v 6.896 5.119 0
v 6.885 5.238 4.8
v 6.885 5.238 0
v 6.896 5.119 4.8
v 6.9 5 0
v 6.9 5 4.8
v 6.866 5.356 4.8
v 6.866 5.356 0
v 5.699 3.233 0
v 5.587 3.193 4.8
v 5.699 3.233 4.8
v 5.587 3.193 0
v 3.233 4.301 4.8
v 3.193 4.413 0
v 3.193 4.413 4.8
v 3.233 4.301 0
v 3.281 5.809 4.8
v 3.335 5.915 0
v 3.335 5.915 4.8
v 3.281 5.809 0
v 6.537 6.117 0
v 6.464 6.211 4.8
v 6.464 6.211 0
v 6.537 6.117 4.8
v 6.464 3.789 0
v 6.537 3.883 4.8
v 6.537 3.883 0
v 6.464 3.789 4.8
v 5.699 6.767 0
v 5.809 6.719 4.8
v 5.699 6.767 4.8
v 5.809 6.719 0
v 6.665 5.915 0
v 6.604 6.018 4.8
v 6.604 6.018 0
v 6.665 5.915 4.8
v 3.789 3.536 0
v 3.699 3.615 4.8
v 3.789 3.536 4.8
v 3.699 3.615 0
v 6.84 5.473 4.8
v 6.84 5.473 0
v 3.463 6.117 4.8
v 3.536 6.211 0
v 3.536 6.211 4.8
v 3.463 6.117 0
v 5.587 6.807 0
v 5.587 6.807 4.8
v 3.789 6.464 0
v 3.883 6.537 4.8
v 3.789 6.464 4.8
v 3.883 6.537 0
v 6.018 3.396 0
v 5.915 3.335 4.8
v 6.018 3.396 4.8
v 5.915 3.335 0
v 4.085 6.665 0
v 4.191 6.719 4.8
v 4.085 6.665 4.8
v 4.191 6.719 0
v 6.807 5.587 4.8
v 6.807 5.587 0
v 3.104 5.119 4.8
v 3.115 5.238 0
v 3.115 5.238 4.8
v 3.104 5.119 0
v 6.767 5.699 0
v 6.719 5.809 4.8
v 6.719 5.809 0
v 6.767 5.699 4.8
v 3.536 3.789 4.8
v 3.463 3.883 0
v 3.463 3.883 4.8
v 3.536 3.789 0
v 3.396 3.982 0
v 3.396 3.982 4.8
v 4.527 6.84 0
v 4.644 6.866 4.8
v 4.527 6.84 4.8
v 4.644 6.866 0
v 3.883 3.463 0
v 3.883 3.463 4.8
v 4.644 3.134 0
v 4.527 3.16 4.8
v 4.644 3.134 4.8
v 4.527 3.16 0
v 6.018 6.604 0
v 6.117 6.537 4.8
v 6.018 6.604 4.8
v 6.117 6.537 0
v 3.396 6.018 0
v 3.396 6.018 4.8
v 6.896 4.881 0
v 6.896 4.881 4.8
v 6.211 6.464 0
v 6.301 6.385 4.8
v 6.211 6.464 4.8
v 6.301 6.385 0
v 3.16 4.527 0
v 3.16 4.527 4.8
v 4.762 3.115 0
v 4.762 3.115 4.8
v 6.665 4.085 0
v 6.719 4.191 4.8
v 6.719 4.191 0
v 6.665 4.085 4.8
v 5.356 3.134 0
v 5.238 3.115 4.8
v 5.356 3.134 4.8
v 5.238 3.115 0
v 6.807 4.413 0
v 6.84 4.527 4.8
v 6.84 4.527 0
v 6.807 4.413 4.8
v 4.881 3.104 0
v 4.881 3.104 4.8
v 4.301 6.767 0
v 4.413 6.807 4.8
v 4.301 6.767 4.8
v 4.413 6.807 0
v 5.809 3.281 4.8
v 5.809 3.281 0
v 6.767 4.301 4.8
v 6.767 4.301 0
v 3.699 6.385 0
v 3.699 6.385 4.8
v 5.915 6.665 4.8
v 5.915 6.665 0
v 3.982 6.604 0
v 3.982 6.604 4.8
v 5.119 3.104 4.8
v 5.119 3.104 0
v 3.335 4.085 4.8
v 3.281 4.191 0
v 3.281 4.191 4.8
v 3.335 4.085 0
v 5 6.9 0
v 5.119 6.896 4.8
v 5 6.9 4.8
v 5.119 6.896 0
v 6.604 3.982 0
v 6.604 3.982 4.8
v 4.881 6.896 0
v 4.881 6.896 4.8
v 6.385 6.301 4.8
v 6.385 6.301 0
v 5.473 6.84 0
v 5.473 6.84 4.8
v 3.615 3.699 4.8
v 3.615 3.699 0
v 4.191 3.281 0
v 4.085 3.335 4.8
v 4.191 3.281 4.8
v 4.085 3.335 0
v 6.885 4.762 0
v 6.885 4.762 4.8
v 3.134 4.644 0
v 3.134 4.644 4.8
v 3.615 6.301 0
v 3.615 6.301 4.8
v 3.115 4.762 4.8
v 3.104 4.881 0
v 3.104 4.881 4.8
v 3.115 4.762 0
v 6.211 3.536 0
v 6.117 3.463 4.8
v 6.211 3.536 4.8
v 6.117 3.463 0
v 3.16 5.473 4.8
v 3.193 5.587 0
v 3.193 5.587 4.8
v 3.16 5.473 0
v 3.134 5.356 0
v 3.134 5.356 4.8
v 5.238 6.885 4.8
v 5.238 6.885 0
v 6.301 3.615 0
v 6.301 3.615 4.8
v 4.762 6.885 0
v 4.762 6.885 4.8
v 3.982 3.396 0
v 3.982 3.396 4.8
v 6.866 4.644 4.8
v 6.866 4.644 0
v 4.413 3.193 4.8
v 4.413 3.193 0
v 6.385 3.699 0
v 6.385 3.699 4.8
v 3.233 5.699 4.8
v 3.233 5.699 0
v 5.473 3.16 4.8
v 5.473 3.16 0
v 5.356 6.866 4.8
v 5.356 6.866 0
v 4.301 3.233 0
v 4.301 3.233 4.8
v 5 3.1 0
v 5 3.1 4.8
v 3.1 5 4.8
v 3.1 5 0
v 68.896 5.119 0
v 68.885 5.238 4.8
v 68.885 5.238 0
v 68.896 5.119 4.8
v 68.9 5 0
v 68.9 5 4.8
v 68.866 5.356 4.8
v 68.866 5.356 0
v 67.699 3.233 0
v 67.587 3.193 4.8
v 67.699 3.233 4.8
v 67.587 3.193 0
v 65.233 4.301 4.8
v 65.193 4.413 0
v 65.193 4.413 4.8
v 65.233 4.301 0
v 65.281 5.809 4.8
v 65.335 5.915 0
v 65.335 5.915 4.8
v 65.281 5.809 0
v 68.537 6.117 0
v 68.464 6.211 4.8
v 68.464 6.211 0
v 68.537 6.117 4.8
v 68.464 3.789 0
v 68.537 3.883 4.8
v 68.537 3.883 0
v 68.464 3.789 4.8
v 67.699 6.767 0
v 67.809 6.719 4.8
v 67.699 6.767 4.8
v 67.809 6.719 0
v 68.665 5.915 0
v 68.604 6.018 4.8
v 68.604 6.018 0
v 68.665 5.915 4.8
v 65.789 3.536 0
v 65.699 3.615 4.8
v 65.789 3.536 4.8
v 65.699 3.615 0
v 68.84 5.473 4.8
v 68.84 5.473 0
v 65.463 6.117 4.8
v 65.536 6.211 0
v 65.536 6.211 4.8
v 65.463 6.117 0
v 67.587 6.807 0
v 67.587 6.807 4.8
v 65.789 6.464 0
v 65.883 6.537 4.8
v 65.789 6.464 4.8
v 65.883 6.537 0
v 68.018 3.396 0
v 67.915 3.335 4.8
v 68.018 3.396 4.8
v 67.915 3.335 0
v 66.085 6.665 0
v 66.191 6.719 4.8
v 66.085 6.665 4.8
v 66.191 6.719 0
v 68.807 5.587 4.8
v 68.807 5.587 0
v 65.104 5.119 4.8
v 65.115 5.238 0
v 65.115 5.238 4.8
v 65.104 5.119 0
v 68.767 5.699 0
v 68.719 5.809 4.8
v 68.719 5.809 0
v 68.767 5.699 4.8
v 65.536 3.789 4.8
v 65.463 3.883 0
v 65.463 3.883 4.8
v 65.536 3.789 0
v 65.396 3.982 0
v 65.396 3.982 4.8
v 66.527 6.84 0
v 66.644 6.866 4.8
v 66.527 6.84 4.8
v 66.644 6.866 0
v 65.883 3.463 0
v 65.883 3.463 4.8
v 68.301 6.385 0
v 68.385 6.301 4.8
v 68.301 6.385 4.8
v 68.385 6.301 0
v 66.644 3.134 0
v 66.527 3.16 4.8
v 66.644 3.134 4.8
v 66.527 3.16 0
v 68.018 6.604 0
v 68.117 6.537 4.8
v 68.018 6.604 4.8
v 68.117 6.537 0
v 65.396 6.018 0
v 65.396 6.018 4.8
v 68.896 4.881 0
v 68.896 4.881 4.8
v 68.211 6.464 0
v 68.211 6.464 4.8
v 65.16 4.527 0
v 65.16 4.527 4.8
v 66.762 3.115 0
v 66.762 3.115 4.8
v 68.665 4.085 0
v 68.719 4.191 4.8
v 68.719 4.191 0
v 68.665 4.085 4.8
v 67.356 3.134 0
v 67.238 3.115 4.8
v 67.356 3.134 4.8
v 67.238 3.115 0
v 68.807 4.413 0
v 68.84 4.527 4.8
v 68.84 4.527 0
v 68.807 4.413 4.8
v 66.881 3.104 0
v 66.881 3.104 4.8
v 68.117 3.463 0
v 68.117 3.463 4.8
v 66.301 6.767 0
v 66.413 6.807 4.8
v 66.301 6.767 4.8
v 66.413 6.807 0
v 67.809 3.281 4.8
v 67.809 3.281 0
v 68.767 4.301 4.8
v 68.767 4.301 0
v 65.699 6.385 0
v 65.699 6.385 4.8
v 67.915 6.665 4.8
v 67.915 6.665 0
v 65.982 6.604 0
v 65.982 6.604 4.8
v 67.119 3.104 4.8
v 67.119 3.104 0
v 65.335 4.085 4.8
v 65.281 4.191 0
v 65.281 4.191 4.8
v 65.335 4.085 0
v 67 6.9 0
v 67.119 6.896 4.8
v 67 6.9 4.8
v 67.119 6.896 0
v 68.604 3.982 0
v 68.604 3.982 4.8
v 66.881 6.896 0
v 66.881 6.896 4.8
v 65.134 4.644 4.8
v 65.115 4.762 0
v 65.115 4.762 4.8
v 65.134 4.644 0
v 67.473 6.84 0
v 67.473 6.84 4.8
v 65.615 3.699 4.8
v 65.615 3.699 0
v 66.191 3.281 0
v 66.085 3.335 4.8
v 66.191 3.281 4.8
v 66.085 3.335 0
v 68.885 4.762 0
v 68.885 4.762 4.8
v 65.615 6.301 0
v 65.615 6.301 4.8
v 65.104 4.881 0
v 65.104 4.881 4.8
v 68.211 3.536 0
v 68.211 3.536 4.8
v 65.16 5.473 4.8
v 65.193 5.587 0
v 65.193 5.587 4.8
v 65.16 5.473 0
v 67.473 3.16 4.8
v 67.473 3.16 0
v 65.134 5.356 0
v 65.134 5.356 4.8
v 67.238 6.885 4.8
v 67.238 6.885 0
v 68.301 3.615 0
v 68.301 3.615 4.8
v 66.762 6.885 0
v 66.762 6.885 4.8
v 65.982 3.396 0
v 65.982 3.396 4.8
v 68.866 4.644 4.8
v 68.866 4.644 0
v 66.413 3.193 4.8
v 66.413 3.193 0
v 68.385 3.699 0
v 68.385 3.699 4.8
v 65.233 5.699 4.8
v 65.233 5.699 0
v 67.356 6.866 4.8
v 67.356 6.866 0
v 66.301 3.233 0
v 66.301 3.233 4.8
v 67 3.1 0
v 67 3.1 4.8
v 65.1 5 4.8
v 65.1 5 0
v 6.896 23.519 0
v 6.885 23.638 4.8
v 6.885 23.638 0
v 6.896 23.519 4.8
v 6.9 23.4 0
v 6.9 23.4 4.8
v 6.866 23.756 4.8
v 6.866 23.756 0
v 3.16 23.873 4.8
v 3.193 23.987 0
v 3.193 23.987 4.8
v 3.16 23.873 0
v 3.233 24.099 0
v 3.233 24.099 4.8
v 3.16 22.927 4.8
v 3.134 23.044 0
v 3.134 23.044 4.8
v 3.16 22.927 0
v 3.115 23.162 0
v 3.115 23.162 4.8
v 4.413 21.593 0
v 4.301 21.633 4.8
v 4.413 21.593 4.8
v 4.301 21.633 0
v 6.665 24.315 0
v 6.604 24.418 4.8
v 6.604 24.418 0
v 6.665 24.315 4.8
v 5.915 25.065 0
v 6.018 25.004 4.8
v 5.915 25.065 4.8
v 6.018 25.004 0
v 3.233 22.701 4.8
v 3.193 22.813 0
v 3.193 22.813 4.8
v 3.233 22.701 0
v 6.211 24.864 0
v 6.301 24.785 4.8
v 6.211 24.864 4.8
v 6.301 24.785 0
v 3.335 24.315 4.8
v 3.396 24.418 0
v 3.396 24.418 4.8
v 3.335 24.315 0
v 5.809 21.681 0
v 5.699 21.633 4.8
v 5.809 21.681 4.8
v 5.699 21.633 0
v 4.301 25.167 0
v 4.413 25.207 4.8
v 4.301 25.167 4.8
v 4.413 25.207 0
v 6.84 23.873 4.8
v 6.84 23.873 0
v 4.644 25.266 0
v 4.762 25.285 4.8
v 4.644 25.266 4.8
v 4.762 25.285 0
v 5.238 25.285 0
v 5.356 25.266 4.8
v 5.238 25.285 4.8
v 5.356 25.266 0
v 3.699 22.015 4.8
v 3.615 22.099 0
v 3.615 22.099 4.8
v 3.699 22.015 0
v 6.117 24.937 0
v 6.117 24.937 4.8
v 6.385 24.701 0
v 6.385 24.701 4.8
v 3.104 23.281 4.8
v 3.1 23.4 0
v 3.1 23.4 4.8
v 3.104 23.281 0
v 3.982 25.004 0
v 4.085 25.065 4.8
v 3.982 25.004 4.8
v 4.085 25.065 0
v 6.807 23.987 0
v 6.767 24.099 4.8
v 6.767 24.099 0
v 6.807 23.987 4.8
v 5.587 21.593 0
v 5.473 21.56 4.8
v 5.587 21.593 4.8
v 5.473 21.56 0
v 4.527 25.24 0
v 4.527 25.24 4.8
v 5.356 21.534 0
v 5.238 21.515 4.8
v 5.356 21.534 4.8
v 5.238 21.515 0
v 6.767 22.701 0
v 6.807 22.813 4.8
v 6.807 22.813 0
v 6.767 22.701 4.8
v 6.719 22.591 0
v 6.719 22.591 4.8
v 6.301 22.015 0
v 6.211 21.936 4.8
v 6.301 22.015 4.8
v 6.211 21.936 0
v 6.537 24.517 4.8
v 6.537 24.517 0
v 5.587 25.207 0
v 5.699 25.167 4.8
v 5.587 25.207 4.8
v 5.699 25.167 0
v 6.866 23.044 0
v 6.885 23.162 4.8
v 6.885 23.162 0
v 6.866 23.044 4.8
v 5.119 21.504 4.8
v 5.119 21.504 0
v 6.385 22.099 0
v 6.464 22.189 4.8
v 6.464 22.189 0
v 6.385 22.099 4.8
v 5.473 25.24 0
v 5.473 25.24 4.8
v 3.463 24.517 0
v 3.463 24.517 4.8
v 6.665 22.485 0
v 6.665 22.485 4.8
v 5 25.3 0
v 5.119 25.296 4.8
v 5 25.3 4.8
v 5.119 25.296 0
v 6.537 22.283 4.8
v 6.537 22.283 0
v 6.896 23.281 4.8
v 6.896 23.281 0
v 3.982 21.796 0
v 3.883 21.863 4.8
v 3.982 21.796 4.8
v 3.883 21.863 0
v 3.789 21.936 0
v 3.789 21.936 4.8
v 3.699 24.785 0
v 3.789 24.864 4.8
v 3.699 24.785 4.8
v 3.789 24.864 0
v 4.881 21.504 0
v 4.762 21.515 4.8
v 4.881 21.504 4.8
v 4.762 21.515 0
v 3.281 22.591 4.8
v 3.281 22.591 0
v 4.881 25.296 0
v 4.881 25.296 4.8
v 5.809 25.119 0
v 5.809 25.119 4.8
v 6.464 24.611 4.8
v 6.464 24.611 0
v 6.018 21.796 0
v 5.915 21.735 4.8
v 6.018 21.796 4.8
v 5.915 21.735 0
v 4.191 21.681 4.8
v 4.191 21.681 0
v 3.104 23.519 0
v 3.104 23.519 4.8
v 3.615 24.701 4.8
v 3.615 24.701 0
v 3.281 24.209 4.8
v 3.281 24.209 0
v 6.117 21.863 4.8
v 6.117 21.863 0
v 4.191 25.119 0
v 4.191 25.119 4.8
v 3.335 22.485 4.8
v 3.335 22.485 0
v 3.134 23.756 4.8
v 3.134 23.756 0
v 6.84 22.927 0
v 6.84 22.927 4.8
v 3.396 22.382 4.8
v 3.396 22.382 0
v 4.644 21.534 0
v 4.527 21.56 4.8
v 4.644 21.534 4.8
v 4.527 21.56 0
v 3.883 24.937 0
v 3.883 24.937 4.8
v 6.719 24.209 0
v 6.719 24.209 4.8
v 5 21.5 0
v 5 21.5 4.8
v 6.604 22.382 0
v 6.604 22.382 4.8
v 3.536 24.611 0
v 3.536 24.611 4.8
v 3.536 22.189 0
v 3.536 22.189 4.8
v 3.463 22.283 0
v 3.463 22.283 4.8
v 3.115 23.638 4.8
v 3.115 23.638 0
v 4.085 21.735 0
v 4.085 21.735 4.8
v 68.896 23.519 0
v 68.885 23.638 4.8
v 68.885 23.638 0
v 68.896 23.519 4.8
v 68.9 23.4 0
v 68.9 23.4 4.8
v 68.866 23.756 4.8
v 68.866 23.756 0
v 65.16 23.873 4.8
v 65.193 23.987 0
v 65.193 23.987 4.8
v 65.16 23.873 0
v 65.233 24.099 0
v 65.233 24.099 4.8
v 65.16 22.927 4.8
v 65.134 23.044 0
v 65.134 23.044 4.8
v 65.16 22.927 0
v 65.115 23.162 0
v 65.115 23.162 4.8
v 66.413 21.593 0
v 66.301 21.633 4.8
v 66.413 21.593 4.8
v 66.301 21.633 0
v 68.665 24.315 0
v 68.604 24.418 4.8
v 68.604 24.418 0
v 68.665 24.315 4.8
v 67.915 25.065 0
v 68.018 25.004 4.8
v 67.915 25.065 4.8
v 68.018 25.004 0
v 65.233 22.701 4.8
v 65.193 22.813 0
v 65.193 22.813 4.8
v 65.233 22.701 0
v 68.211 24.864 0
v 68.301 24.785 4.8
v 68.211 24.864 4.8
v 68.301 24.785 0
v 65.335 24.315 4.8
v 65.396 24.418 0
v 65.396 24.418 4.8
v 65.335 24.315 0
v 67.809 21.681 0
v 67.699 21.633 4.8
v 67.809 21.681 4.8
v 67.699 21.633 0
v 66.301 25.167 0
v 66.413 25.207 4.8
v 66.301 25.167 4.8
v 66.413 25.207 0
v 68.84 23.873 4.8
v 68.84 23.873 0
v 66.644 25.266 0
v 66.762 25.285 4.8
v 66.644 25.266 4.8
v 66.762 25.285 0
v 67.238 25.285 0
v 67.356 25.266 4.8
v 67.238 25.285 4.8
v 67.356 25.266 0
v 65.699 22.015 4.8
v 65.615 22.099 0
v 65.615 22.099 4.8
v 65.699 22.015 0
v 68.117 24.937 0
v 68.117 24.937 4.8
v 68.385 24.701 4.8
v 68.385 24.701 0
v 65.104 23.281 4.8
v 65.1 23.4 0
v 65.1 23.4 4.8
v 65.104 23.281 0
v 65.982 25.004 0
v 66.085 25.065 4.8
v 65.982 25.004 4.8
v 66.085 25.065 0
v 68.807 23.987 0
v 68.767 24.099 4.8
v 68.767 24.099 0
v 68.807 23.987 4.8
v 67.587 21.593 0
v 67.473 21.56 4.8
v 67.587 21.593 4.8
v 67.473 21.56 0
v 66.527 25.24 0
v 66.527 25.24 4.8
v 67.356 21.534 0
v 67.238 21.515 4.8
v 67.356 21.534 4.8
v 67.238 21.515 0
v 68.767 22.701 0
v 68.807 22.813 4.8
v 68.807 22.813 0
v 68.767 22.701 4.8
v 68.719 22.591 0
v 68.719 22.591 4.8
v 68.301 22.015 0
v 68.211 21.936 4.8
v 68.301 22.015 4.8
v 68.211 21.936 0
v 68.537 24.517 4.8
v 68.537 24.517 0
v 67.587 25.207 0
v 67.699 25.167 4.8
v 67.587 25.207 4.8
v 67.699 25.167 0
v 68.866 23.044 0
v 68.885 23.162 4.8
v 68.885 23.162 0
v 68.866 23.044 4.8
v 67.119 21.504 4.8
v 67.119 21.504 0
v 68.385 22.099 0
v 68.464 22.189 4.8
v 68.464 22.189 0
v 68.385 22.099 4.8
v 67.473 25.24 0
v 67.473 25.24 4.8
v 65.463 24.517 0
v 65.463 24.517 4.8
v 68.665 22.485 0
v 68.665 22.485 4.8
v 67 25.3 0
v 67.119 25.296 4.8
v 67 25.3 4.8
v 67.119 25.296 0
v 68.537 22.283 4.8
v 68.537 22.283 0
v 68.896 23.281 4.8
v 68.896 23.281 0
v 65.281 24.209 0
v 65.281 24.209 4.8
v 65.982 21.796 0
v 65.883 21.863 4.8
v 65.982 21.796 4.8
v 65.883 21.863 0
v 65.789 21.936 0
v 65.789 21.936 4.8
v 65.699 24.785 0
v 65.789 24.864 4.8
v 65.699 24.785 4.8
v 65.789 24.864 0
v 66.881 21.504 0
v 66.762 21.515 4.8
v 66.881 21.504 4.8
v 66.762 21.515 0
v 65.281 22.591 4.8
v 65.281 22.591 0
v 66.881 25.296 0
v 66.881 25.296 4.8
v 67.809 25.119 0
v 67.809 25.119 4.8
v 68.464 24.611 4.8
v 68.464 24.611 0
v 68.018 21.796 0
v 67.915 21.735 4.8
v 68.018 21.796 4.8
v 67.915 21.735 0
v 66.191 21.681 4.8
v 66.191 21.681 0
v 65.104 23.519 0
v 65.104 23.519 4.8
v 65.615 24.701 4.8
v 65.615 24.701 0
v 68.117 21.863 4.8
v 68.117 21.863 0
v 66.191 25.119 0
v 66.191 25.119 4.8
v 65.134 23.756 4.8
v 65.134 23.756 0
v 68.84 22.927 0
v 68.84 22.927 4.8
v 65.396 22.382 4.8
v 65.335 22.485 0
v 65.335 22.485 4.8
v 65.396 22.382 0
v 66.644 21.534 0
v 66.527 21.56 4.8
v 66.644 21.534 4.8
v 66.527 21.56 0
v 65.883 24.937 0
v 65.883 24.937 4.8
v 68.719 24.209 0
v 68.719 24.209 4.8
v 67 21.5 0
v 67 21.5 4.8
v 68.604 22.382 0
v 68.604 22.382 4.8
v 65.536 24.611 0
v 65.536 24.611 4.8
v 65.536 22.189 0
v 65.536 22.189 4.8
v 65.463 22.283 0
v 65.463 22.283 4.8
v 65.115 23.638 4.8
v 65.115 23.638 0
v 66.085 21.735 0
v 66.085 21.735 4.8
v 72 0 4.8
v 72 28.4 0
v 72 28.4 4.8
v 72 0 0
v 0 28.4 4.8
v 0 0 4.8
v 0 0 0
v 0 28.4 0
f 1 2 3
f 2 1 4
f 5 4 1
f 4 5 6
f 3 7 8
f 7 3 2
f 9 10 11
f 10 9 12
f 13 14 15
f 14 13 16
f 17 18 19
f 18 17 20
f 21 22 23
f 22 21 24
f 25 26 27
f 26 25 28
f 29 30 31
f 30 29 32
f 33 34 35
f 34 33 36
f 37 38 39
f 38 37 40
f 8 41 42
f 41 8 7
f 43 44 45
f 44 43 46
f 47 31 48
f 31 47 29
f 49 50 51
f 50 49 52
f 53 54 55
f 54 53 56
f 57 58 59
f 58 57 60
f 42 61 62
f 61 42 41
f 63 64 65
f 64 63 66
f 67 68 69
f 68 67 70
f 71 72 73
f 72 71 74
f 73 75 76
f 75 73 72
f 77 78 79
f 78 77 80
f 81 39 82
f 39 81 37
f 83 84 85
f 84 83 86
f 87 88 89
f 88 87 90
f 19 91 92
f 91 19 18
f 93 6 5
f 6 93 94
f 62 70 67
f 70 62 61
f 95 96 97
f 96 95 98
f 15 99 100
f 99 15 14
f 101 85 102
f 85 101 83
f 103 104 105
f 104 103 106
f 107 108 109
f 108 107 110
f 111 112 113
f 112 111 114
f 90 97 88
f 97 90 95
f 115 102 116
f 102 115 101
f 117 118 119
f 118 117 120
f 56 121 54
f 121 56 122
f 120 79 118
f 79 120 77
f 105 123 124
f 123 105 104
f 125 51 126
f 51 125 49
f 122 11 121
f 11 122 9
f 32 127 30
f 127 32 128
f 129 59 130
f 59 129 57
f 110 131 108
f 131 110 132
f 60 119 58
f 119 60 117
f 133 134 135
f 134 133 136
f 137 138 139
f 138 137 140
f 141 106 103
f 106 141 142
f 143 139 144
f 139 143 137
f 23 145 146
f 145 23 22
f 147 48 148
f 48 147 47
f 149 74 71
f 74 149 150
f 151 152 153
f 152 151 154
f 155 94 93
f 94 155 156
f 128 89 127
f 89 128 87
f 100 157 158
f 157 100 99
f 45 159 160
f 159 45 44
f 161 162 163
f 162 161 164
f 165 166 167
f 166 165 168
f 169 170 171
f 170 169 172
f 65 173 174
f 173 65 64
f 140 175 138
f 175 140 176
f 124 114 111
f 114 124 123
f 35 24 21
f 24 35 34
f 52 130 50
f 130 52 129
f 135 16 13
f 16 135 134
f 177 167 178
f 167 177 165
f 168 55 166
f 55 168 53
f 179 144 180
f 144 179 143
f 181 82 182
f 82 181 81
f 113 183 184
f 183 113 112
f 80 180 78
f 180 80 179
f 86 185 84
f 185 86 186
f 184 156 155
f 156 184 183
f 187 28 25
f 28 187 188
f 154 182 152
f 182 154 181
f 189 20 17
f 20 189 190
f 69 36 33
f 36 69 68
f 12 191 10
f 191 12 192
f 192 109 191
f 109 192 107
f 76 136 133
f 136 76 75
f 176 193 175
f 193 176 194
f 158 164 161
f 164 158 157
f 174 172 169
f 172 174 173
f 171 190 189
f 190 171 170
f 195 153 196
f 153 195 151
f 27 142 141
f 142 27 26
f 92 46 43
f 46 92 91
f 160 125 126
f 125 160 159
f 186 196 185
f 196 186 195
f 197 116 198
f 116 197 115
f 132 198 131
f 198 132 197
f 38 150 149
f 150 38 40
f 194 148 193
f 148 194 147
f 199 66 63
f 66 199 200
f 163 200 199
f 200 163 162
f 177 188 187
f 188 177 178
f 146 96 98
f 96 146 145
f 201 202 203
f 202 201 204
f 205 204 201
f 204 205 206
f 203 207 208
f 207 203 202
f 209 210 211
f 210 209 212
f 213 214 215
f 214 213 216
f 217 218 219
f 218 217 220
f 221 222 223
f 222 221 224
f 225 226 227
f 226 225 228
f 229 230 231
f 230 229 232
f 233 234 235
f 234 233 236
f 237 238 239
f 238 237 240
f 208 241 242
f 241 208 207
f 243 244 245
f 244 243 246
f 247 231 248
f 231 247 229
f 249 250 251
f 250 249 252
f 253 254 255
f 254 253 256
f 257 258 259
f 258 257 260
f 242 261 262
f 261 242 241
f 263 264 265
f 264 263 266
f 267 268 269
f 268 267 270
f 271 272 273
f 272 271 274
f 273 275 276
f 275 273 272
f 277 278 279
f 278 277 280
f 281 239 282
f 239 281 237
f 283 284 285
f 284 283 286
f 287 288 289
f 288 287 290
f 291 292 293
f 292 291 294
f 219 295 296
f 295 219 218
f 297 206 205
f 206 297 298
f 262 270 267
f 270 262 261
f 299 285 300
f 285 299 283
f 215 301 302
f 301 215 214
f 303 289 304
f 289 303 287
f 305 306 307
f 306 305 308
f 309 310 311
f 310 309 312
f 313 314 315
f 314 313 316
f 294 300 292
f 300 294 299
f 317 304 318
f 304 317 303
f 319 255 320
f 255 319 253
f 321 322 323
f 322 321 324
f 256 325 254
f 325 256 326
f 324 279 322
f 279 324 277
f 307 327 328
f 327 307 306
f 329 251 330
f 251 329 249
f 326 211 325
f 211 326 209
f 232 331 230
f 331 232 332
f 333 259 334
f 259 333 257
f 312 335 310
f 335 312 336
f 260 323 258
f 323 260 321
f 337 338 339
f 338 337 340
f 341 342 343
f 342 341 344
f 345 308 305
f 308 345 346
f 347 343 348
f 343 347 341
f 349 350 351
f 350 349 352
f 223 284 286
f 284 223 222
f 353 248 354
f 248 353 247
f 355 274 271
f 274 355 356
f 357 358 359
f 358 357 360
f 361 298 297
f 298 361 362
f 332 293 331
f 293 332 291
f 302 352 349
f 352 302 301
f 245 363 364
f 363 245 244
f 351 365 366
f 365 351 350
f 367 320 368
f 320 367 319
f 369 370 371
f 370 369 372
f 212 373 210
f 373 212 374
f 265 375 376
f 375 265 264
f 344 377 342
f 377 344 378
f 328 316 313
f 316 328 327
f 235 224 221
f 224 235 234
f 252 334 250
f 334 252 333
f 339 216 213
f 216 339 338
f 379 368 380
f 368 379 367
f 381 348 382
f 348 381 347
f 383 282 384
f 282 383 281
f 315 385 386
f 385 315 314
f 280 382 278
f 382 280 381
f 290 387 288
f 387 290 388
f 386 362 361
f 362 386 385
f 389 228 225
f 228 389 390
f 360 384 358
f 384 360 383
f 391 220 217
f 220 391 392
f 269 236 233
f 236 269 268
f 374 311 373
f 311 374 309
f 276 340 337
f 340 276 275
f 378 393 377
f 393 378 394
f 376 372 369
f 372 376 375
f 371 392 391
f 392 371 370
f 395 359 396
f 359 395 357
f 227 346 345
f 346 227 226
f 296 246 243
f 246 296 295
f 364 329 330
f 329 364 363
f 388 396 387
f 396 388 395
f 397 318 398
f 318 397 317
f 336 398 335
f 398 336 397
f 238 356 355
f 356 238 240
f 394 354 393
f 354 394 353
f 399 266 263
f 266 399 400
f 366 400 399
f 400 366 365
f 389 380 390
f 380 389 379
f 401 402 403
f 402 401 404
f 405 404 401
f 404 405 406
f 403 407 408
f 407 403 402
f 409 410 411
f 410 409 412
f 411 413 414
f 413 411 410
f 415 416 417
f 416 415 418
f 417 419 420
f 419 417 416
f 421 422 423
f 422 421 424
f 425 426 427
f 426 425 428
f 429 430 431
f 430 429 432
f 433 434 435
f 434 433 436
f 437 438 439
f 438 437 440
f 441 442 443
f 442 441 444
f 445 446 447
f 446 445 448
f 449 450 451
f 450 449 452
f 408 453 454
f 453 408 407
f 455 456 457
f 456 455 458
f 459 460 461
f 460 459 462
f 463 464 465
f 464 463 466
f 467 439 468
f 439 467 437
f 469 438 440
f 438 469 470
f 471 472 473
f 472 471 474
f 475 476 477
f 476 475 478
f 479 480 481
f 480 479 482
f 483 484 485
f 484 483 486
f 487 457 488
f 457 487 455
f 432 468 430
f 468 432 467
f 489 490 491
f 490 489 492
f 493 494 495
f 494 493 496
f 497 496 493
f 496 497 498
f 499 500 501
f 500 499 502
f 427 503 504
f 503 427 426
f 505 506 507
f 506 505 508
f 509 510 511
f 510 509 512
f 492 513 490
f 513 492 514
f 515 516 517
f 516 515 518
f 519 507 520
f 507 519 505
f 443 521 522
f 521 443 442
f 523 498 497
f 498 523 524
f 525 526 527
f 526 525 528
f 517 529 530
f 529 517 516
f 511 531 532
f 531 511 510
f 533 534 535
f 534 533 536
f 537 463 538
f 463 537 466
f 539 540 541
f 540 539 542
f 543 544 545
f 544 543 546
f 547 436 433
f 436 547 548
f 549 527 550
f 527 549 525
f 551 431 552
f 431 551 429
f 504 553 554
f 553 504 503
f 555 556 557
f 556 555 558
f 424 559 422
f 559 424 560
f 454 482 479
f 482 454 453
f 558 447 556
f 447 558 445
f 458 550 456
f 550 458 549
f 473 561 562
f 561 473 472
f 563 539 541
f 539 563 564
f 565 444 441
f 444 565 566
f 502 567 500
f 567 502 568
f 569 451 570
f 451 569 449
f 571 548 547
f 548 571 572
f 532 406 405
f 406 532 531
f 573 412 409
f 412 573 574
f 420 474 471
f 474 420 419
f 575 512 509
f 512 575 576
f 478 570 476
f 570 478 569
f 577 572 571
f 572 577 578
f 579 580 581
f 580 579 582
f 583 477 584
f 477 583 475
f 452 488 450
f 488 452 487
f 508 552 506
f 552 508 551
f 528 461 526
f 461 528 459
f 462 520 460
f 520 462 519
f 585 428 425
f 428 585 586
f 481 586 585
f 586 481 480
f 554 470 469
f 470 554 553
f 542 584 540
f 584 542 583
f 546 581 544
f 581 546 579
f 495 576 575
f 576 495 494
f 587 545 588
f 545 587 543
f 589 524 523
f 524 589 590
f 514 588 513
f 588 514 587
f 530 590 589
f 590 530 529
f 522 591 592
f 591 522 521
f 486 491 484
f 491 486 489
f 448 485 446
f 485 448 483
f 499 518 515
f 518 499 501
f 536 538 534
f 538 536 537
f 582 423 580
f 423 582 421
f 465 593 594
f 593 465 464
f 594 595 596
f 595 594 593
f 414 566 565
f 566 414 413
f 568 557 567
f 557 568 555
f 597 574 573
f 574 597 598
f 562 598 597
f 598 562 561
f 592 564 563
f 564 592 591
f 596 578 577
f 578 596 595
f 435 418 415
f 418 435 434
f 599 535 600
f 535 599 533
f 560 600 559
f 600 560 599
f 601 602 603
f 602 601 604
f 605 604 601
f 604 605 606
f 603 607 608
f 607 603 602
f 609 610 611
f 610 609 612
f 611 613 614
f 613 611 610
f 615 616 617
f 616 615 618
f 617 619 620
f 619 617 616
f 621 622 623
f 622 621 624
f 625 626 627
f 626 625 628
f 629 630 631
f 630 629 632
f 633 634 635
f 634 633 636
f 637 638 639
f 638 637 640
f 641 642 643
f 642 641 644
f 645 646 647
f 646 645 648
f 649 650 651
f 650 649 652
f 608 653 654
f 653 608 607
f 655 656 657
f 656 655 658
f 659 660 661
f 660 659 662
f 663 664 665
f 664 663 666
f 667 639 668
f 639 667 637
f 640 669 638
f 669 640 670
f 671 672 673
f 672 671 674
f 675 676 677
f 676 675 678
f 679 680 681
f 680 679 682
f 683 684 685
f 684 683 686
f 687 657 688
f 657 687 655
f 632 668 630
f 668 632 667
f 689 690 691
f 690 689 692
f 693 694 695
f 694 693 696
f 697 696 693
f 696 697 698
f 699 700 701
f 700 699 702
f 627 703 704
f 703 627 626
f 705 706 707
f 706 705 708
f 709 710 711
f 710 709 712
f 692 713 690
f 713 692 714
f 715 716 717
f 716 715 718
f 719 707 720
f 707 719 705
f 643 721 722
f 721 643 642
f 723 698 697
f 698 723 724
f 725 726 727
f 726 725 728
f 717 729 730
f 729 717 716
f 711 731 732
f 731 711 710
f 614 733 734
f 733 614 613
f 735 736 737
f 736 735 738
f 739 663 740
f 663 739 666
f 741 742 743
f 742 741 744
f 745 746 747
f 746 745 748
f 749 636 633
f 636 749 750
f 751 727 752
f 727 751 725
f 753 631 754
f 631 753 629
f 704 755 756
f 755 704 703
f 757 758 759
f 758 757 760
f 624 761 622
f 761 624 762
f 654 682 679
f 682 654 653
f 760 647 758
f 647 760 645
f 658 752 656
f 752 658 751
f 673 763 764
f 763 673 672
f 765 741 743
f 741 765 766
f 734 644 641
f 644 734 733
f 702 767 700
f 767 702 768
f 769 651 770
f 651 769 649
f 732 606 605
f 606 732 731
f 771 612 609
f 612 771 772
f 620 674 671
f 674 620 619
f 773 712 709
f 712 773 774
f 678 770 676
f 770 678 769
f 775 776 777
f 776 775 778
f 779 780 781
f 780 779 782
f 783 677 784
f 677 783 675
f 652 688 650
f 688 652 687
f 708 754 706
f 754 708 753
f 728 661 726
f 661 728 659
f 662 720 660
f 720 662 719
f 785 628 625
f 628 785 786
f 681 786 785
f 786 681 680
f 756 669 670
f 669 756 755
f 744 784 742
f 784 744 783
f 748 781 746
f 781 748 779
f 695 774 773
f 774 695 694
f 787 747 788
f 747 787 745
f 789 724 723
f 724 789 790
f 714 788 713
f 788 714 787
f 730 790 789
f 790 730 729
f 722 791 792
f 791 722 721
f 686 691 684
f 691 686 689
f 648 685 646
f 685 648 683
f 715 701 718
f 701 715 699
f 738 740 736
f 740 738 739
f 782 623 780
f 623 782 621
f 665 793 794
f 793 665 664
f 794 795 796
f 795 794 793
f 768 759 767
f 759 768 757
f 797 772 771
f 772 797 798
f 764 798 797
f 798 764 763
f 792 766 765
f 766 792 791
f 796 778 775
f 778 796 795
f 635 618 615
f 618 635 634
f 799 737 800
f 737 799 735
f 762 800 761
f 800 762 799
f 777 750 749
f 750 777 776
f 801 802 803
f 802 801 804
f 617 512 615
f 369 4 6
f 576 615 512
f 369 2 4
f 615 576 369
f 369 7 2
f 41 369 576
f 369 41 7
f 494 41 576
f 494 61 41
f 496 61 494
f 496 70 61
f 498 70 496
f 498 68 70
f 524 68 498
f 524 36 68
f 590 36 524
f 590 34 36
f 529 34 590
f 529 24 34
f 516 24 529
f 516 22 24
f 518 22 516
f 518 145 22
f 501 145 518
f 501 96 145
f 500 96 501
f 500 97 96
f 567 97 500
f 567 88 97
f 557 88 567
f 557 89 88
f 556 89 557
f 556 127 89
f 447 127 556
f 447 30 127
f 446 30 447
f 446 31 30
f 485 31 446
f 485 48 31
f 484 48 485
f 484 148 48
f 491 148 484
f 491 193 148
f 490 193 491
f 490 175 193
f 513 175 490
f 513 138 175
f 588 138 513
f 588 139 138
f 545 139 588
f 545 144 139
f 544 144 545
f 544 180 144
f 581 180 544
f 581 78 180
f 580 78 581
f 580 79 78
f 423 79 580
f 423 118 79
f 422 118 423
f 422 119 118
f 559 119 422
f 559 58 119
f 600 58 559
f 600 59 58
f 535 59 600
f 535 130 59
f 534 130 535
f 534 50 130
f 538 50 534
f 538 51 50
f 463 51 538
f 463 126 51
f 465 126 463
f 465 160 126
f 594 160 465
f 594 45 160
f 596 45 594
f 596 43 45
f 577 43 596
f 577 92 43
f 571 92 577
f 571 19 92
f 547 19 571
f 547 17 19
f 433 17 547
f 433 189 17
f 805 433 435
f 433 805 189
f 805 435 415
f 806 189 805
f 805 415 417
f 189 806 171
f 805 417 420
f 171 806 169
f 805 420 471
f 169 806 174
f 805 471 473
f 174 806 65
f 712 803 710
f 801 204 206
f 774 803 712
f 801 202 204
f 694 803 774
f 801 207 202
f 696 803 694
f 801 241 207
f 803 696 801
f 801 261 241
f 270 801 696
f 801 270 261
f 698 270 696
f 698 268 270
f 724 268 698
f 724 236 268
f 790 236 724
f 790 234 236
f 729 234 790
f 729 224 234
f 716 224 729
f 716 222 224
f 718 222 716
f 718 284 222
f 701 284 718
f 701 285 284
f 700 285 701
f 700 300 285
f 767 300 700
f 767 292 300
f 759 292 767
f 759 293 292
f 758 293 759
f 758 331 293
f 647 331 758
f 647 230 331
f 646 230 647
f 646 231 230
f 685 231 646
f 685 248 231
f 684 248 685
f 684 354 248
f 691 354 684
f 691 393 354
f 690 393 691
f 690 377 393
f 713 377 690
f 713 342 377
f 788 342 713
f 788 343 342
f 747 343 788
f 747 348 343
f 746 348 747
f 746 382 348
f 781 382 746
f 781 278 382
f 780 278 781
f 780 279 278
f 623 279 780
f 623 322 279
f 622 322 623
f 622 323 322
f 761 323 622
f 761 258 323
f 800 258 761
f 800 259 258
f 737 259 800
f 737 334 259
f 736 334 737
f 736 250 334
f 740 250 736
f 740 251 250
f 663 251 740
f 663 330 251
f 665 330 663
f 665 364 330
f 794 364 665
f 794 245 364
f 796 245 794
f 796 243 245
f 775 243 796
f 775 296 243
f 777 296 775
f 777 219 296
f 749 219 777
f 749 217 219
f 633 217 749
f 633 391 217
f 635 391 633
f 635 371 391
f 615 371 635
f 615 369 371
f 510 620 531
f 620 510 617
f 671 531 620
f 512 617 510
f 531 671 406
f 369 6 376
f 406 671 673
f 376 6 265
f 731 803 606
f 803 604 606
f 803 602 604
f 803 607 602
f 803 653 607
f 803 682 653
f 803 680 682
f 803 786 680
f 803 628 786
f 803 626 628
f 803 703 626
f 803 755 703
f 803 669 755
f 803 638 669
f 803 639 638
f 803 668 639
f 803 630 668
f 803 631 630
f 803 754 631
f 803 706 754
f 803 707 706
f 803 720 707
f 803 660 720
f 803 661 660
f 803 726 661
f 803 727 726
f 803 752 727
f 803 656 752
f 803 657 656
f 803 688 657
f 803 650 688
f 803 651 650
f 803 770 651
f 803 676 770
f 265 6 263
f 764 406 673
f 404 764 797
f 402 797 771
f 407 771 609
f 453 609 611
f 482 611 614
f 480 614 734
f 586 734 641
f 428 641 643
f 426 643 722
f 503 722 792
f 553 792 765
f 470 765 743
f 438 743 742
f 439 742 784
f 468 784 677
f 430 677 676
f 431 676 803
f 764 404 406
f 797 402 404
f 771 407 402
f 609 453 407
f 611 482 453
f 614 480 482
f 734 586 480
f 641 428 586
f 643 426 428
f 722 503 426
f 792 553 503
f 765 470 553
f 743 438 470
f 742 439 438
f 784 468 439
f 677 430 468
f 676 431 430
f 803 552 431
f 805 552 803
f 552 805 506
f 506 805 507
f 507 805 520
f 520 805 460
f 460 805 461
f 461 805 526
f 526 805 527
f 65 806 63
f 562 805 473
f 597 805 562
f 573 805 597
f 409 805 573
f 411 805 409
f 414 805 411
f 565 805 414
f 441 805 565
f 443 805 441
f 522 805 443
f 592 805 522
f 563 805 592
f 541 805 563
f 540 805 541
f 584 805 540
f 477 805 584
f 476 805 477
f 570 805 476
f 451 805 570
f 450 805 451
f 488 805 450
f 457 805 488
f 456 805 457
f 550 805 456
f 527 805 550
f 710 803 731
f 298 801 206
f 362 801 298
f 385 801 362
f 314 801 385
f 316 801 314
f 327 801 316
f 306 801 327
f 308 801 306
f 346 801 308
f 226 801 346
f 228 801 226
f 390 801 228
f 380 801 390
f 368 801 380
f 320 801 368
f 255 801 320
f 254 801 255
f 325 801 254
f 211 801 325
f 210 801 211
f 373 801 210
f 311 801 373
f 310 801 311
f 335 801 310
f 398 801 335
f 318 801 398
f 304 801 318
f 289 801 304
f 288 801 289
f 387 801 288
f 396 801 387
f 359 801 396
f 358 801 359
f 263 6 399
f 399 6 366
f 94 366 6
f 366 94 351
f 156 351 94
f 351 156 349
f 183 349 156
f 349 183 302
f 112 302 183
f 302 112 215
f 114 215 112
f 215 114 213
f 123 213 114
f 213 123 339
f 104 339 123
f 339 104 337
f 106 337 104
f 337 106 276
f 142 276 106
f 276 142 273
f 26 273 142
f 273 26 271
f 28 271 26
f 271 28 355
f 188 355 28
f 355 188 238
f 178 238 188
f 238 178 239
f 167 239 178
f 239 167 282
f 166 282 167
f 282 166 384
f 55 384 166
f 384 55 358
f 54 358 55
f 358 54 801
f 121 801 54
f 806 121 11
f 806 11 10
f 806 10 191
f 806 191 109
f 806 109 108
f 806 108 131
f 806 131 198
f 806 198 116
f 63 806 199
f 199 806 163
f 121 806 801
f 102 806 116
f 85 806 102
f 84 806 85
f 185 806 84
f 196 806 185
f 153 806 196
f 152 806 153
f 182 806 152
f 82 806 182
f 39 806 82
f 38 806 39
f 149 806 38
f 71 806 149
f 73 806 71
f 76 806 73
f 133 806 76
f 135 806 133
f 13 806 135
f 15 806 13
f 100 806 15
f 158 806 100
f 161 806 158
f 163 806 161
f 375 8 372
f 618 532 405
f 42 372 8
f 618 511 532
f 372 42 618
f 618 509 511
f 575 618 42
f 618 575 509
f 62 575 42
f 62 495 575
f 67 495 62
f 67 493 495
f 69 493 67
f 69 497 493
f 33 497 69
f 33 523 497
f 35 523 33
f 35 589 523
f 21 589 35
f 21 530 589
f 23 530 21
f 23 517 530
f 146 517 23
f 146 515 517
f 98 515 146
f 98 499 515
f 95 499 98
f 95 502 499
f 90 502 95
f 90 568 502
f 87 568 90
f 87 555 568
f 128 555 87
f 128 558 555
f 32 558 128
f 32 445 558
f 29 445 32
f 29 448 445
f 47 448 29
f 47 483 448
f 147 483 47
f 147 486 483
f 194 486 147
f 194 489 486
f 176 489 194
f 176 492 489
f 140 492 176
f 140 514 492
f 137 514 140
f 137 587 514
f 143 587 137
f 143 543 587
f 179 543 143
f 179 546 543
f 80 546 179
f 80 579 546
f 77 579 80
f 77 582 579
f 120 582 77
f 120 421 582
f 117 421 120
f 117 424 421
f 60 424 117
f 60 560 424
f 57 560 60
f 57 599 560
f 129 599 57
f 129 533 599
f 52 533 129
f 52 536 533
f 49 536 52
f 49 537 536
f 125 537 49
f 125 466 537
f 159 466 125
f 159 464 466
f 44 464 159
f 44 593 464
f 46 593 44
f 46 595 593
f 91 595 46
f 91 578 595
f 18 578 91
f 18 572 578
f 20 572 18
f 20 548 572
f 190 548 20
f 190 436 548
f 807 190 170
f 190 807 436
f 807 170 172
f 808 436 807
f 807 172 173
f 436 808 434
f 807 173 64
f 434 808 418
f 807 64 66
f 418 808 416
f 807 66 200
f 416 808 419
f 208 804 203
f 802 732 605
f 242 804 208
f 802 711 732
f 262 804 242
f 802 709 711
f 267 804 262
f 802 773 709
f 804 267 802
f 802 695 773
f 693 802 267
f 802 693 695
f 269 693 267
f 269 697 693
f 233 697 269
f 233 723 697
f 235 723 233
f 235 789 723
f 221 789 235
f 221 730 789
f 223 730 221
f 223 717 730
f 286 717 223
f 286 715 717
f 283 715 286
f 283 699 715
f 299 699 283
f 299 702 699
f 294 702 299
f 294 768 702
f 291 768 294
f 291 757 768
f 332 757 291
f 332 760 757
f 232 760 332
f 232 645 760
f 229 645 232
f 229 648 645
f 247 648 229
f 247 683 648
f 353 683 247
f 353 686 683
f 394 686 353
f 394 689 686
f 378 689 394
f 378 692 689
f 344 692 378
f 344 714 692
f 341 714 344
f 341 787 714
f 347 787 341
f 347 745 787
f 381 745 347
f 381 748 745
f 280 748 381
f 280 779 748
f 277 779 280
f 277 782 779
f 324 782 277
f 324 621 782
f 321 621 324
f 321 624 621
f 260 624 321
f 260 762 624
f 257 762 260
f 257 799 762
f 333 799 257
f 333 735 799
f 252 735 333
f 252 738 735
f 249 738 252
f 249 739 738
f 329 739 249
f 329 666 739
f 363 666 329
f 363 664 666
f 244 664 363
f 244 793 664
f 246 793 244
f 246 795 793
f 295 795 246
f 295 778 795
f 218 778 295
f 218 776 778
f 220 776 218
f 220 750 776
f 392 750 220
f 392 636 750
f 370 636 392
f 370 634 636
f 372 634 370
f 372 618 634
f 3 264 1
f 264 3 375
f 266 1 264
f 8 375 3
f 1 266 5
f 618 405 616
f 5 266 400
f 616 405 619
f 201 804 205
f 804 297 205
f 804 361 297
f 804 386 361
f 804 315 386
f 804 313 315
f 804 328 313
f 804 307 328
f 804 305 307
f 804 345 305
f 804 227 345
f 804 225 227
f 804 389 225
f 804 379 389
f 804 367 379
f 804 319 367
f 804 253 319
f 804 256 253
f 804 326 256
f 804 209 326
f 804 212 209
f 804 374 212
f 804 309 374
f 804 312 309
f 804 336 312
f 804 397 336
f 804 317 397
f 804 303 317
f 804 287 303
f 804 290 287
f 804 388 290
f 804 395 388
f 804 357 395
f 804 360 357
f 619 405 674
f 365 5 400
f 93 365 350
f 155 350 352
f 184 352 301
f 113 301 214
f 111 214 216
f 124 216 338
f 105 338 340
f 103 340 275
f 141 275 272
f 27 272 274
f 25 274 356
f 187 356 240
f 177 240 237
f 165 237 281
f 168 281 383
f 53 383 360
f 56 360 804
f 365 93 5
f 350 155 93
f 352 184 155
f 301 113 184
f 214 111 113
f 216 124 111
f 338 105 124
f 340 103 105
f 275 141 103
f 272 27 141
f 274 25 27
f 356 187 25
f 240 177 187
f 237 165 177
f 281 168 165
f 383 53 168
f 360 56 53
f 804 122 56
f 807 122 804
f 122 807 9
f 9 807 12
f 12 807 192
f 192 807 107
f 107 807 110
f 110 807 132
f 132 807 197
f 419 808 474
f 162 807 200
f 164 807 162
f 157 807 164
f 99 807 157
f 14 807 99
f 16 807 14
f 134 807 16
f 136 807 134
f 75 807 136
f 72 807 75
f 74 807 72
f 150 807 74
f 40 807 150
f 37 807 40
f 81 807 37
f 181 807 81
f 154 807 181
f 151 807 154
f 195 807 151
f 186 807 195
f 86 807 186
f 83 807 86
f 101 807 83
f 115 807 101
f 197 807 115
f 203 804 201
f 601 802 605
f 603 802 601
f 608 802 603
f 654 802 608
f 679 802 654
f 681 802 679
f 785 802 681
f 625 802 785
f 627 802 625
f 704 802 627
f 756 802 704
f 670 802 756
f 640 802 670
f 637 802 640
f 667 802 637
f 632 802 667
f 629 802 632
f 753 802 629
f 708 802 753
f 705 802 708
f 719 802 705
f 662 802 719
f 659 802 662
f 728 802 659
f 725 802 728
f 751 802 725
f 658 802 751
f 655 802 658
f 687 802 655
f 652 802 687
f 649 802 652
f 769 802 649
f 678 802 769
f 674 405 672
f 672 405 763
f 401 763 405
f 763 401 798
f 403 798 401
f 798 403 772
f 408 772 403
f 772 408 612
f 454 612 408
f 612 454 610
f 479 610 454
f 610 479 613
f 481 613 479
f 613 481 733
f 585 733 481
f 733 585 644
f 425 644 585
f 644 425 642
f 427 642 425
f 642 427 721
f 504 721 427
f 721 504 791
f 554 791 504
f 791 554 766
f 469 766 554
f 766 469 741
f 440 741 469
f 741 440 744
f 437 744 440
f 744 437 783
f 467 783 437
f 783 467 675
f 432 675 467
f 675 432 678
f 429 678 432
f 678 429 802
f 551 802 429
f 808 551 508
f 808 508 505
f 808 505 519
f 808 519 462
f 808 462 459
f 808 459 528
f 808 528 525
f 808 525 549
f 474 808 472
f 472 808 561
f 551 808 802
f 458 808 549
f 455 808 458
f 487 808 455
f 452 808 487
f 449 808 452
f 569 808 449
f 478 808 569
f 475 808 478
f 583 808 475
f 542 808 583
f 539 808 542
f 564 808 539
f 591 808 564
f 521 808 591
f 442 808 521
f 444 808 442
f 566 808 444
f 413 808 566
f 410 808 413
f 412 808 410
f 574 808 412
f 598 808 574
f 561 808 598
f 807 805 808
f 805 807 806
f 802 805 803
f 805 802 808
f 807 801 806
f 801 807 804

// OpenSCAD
// file: ../configurations/global.scad
housing_facades_throws_diameter = 3.8;

// external size
case_external_x_size = 90;
case_external_y_size = 140;
case_external_z_size = 38;
case_external_panes_thickness = 4.8;

facade_front_round_edges_radius = 5;
facade_throws_margin = 5;

// facade corners
facade_corners_offset_lenght = 9;
facade_corners_main_x_size = 19;
facade_corners_main_y_size = 19;
facade_corners_main_thickness = 11;
facade_corners_correction_offset_length = 0.2;
facade_corners_correction_offset_thickness = 0.0;
facade_fn = 100;


// Generics
insert_throw_diameter = 4.2;
insert_throw_length = 6 + 2;
// file: ../libraries/commons.scad
/**
 * forEachCoord
 * Wrapper to apply child on each element
 */
module forEachCoord(coords_list) {
    for (coords = coords_list)
        translate(
            [
                coords[0] == undef ? 0 : coords[0],
                coords[1] == undef ? 0 : coords[1],
                coords[2] == undef ? 0 : coords[2],
            ]
        )
            children();
}
// main file
use <./../libraries/commons.scad>
include <./../configurations/global.scad>


/**
 * facadeTopPiece
 * @name facadeTopPiece
 * @description Piece can be printed or CNC cutted #3DPrint, #CNC
 * @type piece
 * @parent housingComponent
 * @stl
 */
module facadeTopPiece(
    x_size = case_external_x_size - (facade_corners_offset_lenght * 2),
    y_size = case_external_z_size - (case_external_panes_thickness * 2),
    z_size = case_external_panes_thickness,
    throws_margin = facade_throws_margin,
    throws_diameter = housing_facades_throws_diameter,

    $fn = facade_fn
) {
    echo(str("x_size: ", x_size, " y_size: ", y_size, " z_size: ", z_size));

    difference() {
        color("BurlyWood")
            cube([x_size, y_size, z_size]);

        translate([0, 0, -z_size / 2])
            forEachCoord([
                [throws_margin, throws_margin],
                [x_size - throws_margin, throws_margin],
                [throws_margin, y_size - throws_margin],
                [x_size - throws_margin, y_size - throws_margin,],
            ])
                cylinder(h = z_size * 2, d = throws_diameter, $fn = $fn);
    }

}

facadeTopPiece();
